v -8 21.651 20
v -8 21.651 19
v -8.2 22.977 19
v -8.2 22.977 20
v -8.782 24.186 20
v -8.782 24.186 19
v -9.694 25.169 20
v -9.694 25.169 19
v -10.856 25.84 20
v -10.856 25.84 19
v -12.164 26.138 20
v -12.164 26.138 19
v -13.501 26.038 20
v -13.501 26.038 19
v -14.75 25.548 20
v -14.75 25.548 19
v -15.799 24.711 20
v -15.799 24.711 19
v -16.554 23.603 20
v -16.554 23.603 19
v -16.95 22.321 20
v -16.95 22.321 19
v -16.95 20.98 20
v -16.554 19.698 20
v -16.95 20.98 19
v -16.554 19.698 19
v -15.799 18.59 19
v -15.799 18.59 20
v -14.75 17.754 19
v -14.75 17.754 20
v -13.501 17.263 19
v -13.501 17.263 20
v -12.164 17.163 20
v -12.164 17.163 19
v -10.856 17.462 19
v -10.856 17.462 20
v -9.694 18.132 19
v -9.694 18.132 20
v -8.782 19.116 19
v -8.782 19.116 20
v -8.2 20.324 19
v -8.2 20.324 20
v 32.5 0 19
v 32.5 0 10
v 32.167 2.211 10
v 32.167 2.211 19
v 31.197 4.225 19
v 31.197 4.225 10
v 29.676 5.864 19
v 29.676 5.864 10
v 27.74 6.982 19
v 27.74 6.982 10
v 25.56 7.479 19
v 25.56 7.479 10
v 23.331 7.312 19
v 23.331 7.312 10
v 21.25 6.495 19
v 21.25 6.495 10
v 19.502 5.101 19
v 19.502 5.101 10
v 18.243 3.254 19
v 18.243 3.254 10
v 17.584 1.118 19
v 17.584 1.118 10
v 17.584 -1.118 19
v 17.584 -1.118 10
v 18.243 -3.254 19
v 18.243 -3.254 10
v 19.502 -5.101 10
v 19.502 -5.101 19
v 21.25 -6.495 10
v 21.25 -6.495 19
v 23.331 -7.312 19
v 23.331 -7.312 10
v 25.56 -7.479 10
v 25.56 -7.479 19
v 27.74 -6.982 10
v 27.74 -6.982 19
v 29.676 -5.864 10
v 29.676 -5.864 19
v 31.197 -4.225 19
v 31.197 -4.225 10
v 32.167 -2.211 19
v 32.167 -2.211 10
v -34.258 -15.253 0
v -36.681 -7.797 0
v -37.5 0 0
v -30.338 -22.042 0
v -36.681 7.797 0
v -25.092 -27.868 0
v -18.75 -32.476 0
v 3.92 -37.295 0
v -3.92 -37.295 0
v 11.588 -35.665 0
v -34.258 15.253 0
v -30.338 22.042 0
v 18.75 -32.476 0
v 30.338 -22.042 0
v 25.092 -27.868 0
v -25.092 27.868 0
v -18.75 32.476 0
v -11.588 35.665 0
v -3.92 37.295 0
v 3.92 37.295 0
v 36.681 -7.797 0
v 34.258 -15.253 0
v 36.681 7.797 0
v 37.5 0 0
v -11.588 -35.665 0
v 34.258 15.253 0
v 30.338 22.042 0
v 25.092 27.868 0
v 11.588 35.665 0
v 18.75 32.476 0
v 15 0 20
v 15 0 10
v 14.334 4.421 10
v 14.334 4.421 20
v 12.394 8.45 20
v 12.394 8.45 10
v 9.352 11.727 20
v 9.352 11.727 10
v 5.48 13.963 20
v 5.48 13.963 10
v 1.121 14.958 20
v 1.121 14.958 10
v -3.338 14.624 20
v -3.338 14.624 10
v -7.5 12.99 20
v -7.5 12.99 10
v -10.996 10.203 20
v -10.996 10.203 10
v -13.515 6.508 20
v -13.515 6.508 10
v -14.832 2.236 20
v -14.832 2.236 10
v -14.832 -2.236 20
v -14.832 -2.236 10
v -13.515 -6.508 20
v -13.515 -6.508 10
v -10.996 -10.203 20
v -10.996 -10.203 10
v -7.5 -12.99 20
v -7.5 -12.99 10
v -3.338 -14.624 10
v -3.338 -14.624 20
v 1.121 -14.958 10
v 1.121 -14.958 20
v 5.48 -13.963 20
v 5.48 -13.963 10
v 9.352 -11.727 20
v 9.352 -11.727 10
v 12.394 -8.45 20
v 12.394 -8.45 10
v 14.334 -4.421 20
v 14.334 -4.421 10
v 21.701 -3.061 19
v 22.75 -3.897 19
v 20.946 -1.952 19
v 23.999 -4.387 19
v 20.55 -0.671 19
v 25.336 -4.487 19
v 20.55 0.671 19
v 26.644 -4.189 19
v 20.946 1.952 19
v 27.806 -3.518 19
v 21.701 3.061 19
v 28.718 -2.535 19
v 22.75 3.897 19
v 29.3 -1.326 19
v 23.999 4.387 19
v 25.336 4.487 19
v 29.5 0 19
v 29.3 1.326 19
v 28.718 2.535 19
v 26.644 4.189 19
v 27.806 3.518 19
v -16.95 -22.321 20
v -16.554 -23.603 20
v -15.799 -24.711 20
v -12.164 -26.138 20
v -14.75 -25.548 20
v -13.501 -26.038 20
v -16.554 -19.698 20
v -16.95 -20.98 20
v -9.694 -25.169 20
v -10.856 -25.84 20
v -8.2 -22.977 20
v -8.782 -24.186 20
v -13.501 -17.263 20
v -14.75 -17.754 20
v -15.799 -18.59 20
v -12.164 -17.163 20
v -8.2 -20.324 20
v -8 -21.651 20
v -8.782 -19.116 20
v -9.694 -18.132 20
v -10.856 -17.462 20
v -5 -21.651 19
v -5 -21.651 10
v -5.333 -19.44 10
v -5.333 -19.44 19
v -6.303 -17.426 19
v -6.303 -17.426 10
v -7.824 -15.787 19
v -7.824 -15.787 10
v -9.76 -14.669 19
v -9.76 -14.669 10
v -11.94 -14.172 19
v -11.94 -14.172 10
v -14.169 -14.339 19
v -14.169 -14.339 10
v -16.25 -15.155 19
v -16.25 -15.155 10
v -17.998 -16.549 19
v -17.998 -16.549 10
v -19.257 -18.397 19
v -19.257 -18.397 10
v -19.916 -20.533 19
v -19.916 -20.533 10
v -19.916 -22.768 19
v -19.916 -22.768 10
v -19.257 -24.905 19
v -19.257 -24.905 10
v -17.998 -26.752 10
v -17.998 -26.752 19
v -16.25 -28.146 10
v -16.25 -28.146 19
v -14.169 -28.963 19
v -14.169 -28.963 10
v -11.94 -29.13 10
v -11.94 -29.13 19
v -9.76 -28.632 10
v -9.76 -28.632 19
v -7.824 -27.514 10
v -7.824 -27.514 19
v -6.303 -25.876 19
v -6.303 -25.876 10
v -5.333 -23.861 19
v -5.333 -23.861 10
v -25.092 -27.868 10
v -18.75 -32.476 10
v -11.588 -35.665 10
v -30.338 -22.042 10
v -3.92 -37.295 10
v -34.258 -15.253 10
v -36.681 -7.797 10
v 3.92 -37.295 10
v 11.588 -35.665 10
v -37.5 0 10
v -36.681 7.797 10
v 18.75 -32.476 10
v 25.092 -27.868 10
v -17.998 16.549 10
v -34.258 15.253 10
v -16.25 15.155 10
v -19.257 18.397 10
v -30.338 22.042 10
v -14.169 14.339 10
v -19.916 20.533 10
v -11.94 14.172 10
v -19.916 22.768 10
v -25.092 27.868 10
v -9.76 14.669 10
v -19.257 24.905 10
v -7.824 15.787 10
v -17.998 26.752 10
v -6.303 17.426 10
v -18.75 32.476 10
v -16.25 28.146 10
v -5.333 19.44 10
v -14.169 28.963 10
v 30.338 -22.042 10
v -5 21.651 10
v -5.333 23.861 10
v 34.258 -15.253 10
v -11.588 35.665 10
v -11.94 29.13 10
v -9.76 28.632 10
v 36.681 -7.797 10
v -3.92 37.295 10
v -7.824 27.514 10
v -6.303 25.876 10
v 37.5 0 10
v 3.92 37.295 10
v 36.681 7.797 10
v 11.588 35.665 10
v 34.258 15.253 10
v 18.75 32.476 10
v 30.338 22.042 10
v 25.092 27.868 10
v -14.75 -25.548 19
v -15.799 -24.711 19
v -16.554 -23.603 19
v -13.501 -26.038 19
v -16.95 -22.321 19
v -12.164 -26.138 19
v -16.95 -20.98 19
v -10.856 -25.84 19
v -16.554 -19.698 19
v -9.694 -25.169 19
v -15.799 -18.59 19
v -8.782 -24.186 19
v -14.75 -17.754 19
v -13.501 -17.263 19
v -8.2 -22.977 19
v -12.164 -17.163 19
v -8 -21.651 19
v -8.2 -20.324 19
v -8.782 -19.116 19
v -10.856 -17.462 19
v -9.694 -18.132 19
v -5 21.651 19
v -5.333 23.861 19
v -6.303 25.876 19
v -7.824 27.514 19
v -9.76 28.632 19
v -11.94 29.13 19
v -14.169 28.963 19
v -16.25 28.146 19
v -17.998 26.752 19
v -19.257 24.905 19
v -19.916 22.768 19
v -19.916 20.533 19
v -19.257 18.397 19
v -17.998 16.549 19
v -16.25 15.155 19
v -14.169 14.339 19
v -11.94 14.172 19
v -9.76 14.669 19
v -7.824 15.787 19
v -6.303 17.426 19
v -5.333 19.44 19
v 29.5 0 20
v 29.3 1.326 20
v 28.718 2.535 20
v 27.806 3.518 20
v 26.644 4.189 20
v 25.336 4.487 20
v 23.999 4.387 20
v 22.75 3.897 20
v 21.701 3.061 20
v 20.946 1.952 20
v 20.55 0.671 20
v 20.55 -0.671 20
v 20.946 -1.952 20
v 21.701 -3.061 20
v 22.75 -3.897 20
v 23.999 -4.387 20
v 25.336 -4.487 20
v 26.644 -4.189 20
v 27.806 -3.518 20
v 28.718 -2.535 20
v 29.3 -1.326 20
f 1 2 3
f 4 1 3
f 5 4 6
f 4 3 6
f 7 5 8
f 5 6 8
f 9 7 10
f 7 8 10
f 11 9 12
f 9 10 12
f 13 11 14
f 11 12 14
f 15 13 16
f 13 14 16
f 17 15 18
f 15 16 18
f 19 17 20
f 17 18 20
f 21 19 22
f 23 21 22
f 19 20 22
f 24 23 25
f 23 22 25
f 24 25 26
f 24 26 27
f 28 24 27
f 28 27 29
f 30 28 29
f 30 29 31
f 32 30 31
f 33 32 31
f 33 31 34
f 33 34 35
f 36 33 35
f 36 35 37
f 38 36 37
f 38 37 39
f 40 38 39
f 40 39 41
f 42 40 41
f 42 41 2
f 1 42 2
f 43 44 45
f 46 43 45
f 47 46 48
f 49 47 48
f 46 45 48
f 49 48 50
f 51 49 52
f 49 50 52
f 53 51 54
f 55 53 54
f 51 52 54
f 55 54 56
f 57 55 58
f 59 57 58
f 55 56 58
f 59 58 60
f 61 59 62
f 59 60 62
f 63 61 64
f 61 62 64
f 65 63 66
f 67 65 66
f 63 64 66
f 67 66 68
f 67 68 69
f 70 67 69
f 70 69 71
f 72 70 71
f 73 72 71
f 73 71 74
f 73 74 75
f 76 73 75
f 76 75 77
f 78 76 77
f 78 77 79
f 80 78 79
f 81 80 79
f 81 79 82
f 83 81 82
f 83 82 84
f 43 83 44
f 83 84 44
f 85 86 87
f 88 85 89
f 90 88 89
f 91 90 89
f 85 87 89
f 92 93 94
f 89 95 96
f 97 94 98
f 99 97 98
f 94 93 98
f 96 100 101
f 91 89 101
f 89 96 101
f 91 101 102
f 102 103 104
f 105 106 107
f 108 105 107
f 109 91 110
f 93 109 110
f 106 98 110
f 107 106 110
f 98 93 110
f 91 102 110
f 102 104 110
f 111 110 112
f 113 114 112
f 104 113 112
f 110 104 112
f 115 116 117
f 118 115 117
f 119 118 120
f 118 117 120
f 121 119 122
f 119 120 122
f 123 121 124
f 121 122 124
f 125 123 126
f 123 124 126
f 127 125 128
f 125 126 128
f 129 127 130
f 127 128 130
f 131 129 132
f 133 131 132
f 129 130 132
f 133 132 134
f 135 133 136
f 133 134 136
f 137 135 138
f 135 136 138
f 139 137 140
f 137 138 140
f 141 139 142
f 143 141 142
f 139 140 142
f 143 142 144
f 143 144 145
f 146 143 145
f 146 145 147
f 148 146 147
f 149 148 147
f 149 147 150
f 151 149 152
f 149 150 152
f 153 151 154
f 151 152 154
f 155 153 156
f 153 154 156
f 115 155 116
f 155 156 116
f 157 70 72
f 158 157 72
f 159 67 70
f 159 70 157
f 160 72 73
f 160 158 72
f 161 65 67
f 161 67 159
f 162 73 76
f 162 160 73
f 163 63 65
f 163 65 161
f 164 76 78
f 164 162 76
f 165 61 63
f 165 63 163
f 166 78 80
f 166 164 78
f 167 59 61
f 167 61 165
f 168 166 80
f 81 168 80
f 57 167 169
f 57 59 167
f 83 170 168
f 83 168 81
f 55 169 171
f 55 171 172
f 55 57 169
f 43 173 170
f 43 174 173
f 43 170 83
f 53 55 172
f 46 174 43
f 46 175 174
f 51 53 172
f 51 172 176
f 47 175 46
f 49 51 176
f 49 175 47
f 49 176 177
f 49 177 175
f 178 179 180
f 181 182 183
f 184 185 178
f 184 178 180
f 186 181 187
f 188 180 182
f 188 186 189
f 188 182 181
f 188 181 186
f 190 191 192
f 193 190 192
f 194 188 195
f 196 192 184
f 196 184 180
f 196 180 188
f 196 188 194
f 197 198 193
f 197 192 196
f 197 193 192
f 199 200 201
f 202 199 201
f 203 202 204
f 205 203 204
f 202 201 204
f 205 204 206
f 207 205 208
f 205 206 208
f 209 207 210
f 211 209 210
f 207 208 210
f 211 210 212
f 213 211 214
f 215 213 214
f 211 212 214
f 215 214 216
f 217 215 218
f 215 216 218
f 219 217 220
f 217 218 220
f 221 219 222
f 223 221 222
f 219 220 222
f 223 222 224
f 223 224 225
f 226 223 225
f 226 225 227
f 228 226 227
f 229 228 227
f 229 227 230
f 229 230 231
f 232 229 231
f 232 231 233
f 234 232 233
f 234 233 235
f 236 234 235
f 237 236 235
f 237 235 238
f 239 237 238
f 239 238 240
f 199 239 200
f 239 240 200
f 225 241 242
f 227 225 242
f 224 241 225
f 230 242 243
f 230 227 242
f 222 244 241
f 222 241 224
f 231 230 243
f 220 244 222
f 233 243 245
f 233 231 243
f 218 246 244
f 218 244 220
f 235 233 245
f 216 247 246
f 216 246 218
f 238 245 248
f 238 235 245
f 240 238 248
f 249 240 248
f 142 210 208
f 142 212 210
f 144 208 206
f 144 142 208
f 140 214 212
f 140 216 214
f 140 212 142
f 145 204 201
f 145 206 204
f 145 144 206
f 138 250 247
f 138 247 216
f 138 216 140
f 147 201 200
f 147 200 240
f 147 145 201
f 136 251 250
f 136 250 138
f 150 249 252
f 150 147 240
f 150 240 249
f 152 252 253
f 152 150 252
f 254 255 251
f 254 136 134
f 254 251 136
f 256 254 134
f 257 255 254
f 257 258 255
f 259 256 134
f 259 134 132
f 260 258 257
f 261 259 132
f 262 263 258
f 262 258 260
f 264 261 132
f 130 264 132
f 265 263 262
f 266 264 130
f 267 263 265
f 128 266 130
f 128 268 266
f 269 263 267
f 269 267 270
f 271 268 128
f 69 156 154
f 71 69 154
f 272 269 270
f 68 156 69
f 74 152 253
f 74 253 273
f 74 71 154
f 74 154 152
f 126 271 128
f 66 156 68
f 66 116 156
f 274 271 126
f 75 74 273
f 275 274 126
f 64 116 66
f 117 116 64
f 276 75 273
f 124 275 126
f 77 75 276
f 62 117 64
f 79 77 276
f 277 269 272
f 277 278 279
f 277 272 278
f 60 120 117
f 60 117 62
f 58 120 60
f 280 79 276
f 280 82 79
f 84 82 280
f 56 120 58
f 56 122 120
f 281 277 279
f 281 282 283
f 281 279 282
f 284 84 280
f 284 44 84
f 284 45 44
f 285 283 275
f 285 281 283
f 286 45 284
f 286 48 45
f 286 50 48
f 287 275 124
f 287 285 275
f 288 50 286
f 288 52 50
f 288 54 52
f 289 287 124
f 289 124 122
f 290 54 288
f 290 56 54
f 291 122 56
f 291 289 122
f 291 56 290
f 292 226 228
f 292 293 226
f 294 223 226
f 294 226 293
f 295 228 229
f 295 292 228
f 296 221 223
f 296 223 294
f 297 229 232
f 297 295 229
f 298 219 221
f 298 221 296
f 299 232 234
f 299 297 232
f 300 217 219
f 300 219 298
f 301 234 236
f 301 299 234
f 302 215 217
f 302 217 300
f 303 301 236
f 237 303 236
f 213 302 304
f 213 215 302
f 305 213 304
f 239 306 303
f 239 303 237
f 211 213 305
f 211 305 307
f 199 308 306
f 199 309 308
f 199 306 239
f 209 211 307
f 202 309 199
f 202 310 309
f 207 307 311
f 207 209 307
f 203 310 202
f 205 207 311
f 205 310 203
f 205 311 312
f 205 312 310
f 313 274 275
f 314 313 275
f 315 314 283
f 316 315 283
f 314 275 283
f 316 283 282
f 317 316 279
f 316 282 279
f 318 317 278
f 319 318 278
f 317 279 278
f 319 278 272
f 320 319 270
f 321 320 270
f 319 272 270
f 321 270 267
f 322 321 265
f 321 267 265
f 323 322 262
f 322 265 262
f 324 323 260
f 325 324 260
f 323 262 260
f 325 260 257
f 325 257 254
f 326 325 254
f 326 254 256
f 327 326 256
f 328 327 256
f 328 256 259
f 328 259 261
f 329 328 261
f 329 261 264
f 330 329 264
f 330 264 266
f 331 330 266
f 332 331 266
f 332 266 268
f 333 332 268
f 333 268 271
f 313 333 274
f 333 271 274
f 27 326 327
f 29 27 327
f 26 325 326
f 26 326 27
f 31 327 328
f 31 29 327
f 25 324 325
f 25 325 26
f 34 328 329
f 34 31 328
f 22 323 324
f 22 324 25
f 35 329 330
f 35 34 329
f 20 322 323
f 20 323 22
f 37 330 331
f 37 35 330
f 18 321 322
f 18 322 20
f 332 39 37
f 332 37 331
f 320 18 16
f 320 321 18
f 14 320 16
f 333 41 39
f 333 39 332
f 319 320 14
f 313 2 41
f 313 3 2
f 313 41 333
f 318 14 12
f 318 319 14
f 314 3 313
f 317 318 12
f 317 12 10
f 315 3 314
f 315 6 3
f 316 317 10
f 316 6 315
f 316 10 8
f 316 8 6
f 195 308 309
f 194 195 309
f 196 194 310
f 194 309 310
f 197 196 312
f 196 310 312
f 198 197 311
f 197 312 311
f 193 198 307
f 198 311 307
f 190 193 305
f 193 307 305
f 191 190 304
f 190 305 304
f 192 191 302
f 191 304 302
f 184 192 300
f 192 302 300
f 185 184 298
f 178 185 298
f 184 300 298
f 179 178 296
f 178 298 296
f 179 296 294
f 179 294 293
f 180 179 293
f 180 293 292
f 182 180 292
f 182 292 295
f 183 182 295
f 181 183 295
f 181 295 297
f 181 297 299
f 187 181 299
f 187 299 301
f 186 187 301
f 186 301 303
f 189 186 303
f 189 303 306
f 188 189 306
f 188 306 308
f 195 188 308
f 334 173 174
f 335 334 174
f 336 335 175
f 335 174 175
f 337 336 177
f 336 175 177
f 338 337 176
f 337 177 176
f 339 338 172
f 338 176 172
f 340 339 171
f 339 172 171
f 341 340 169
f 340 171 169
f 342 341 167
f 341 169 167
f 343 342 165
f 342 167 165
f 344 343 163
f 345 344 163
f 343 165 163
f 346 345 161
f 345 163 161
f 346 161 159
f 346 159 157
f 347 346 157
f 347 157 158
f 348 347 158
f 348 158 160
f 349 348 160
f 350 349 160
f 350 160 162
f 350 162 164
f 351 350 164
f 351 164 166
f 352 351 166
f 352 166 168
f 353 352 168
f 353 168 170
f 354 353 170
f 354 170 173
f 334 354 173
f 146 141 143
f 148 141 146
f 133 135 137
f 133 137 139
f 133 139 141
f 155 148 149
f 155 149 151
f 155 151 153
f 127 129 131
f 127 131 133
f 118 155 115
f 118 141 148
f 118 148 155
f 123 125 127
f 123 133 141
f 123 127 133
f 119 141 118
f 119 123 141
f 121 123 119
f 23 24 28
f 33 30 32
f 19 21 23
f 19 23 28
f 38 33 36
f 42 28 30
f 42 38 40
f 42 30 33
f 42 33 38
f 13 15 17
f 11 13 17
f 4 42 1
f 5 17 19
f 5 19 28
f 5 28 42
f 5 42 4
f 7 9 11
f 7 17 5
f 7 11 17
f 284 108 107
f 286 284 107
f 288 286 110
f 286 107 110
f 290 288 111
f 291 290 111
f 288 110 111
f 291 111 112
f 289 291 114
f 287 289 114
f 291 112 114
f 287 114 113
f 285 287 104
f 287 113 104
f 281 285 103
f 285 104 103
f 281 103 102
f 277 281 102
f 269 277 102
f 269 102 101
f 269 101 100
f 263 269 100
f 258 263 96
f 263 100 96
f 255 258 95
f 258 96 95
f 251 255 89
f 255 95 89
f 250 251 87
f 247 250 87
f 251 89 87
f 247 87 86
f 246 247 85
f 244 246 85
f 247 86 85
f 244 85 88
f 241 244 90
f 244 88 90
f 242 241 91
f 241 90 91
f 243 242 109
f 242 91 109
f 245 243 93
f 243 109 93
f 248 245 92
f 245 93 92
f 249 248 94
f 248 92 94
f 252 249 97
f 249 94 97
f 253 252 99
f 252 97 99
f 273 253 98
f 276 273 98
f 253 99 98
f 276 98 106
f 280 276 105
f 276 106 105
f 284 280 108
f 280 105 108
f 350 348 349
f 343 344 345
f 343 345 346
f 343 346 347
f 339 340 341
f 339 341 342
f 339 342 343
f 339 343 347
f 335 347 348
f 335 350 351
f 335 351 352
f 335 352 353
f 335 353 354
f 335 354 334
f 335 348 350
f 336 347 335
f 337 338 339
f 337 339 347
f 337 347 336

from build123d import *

# Parameters (mm, degrees)
SKETCH_1_R  = 37.5
PAD_1_DEPTH = 10
SKETCH_2_R  = 15
PAD_2_DEPTH = 10
SKETCH_3_R  = 4.5
PAD_3_DEPTH = 10
SKETCH_4_R  = 7.5
PAD_4_DEPTH = 9
SKETCH_5_R  = 4.5
PAD_5_DEPTH = 10
SKETCH_6_R  = 7.5
PAD_6_DEPTH = 9
SKETCH_7_R  = 4.5
PAD_7_DEPTH = 10
SKETCH_8_R  = 7.5
PAD_8_DEPTH = 9


with BuildPart() as part:
    # Sketch_1 → Pad_1 (new body)
    with BuildSketch(Plane.XY):
        Circle(SKETCH_1_R)
    extrude(amount=PAD_1_DEPTH)

    # Sketch_2 (on Face3 of Pad_1) → Pad_2 (join)
    with BuildSketch(Plane.XY.offset(10)):
        Circle(SKETCH_2_R)
    extrude(amount=PAD_2_DEPTH)

    # Sketch_3 (on Face3 of Pad_2) → Pad_3 (join)
    with BuildSketch(Plane.XY.offset(10)):
        with Locations((25, 0)):
            Circle(SKETCH_3_R)
    extrude(amount=PAD_3_DEPTH)

    # Sketch_4 (on Face3 of Pad_3) → Pad_4 (join)
    with BuildSketch(Plane.XY.offset(10)):
        with Locations((25, 0)):
            Circle(SKETCH_4_R)
    extrude(amount=PAD_4_DEPTH)

    # Sketch_5 (on Face3 of Pad_4) → Pad_5 (join)
    with BuildSketch(Plane.XY.offset(10)):
        with Locations((-12.5, 21.650635)):
            Circle(SKETCH_5_R)
    extrude(amount=PAD_5_DEPTH)

    # Sketch_6 (on Face3 of Pad_5) → Pad_6 (join)
    with BuildSketch(Plane.XY.offset(10)):
        with Locations((-12.5, 21.650635)):
            Circle(SKETCH_6_R)
    extrude(amount=PAD_6_DEPTH)

    # Sketch_7 (on Face3 of Pad_6) → Pad_7 (join)
    with BuildSketch(Plane.XY.offset(10)):
        with Locations((-12.5, -21.650635)):
            Circle(SKETCH_7_R)
    extrude(amount=PAD_7_DEPTH)

    # Sketch_8 (on Face3 of Pad_7) → Pad_8 (join)
    with BuildSketch(Plane.XY.offset(10)):
        with Locations((-12.5, -21.650635)):
            Circle(SKETCH_8_R)
    extrude(amount=PAD_8_DEPTH)


solid = part.part
